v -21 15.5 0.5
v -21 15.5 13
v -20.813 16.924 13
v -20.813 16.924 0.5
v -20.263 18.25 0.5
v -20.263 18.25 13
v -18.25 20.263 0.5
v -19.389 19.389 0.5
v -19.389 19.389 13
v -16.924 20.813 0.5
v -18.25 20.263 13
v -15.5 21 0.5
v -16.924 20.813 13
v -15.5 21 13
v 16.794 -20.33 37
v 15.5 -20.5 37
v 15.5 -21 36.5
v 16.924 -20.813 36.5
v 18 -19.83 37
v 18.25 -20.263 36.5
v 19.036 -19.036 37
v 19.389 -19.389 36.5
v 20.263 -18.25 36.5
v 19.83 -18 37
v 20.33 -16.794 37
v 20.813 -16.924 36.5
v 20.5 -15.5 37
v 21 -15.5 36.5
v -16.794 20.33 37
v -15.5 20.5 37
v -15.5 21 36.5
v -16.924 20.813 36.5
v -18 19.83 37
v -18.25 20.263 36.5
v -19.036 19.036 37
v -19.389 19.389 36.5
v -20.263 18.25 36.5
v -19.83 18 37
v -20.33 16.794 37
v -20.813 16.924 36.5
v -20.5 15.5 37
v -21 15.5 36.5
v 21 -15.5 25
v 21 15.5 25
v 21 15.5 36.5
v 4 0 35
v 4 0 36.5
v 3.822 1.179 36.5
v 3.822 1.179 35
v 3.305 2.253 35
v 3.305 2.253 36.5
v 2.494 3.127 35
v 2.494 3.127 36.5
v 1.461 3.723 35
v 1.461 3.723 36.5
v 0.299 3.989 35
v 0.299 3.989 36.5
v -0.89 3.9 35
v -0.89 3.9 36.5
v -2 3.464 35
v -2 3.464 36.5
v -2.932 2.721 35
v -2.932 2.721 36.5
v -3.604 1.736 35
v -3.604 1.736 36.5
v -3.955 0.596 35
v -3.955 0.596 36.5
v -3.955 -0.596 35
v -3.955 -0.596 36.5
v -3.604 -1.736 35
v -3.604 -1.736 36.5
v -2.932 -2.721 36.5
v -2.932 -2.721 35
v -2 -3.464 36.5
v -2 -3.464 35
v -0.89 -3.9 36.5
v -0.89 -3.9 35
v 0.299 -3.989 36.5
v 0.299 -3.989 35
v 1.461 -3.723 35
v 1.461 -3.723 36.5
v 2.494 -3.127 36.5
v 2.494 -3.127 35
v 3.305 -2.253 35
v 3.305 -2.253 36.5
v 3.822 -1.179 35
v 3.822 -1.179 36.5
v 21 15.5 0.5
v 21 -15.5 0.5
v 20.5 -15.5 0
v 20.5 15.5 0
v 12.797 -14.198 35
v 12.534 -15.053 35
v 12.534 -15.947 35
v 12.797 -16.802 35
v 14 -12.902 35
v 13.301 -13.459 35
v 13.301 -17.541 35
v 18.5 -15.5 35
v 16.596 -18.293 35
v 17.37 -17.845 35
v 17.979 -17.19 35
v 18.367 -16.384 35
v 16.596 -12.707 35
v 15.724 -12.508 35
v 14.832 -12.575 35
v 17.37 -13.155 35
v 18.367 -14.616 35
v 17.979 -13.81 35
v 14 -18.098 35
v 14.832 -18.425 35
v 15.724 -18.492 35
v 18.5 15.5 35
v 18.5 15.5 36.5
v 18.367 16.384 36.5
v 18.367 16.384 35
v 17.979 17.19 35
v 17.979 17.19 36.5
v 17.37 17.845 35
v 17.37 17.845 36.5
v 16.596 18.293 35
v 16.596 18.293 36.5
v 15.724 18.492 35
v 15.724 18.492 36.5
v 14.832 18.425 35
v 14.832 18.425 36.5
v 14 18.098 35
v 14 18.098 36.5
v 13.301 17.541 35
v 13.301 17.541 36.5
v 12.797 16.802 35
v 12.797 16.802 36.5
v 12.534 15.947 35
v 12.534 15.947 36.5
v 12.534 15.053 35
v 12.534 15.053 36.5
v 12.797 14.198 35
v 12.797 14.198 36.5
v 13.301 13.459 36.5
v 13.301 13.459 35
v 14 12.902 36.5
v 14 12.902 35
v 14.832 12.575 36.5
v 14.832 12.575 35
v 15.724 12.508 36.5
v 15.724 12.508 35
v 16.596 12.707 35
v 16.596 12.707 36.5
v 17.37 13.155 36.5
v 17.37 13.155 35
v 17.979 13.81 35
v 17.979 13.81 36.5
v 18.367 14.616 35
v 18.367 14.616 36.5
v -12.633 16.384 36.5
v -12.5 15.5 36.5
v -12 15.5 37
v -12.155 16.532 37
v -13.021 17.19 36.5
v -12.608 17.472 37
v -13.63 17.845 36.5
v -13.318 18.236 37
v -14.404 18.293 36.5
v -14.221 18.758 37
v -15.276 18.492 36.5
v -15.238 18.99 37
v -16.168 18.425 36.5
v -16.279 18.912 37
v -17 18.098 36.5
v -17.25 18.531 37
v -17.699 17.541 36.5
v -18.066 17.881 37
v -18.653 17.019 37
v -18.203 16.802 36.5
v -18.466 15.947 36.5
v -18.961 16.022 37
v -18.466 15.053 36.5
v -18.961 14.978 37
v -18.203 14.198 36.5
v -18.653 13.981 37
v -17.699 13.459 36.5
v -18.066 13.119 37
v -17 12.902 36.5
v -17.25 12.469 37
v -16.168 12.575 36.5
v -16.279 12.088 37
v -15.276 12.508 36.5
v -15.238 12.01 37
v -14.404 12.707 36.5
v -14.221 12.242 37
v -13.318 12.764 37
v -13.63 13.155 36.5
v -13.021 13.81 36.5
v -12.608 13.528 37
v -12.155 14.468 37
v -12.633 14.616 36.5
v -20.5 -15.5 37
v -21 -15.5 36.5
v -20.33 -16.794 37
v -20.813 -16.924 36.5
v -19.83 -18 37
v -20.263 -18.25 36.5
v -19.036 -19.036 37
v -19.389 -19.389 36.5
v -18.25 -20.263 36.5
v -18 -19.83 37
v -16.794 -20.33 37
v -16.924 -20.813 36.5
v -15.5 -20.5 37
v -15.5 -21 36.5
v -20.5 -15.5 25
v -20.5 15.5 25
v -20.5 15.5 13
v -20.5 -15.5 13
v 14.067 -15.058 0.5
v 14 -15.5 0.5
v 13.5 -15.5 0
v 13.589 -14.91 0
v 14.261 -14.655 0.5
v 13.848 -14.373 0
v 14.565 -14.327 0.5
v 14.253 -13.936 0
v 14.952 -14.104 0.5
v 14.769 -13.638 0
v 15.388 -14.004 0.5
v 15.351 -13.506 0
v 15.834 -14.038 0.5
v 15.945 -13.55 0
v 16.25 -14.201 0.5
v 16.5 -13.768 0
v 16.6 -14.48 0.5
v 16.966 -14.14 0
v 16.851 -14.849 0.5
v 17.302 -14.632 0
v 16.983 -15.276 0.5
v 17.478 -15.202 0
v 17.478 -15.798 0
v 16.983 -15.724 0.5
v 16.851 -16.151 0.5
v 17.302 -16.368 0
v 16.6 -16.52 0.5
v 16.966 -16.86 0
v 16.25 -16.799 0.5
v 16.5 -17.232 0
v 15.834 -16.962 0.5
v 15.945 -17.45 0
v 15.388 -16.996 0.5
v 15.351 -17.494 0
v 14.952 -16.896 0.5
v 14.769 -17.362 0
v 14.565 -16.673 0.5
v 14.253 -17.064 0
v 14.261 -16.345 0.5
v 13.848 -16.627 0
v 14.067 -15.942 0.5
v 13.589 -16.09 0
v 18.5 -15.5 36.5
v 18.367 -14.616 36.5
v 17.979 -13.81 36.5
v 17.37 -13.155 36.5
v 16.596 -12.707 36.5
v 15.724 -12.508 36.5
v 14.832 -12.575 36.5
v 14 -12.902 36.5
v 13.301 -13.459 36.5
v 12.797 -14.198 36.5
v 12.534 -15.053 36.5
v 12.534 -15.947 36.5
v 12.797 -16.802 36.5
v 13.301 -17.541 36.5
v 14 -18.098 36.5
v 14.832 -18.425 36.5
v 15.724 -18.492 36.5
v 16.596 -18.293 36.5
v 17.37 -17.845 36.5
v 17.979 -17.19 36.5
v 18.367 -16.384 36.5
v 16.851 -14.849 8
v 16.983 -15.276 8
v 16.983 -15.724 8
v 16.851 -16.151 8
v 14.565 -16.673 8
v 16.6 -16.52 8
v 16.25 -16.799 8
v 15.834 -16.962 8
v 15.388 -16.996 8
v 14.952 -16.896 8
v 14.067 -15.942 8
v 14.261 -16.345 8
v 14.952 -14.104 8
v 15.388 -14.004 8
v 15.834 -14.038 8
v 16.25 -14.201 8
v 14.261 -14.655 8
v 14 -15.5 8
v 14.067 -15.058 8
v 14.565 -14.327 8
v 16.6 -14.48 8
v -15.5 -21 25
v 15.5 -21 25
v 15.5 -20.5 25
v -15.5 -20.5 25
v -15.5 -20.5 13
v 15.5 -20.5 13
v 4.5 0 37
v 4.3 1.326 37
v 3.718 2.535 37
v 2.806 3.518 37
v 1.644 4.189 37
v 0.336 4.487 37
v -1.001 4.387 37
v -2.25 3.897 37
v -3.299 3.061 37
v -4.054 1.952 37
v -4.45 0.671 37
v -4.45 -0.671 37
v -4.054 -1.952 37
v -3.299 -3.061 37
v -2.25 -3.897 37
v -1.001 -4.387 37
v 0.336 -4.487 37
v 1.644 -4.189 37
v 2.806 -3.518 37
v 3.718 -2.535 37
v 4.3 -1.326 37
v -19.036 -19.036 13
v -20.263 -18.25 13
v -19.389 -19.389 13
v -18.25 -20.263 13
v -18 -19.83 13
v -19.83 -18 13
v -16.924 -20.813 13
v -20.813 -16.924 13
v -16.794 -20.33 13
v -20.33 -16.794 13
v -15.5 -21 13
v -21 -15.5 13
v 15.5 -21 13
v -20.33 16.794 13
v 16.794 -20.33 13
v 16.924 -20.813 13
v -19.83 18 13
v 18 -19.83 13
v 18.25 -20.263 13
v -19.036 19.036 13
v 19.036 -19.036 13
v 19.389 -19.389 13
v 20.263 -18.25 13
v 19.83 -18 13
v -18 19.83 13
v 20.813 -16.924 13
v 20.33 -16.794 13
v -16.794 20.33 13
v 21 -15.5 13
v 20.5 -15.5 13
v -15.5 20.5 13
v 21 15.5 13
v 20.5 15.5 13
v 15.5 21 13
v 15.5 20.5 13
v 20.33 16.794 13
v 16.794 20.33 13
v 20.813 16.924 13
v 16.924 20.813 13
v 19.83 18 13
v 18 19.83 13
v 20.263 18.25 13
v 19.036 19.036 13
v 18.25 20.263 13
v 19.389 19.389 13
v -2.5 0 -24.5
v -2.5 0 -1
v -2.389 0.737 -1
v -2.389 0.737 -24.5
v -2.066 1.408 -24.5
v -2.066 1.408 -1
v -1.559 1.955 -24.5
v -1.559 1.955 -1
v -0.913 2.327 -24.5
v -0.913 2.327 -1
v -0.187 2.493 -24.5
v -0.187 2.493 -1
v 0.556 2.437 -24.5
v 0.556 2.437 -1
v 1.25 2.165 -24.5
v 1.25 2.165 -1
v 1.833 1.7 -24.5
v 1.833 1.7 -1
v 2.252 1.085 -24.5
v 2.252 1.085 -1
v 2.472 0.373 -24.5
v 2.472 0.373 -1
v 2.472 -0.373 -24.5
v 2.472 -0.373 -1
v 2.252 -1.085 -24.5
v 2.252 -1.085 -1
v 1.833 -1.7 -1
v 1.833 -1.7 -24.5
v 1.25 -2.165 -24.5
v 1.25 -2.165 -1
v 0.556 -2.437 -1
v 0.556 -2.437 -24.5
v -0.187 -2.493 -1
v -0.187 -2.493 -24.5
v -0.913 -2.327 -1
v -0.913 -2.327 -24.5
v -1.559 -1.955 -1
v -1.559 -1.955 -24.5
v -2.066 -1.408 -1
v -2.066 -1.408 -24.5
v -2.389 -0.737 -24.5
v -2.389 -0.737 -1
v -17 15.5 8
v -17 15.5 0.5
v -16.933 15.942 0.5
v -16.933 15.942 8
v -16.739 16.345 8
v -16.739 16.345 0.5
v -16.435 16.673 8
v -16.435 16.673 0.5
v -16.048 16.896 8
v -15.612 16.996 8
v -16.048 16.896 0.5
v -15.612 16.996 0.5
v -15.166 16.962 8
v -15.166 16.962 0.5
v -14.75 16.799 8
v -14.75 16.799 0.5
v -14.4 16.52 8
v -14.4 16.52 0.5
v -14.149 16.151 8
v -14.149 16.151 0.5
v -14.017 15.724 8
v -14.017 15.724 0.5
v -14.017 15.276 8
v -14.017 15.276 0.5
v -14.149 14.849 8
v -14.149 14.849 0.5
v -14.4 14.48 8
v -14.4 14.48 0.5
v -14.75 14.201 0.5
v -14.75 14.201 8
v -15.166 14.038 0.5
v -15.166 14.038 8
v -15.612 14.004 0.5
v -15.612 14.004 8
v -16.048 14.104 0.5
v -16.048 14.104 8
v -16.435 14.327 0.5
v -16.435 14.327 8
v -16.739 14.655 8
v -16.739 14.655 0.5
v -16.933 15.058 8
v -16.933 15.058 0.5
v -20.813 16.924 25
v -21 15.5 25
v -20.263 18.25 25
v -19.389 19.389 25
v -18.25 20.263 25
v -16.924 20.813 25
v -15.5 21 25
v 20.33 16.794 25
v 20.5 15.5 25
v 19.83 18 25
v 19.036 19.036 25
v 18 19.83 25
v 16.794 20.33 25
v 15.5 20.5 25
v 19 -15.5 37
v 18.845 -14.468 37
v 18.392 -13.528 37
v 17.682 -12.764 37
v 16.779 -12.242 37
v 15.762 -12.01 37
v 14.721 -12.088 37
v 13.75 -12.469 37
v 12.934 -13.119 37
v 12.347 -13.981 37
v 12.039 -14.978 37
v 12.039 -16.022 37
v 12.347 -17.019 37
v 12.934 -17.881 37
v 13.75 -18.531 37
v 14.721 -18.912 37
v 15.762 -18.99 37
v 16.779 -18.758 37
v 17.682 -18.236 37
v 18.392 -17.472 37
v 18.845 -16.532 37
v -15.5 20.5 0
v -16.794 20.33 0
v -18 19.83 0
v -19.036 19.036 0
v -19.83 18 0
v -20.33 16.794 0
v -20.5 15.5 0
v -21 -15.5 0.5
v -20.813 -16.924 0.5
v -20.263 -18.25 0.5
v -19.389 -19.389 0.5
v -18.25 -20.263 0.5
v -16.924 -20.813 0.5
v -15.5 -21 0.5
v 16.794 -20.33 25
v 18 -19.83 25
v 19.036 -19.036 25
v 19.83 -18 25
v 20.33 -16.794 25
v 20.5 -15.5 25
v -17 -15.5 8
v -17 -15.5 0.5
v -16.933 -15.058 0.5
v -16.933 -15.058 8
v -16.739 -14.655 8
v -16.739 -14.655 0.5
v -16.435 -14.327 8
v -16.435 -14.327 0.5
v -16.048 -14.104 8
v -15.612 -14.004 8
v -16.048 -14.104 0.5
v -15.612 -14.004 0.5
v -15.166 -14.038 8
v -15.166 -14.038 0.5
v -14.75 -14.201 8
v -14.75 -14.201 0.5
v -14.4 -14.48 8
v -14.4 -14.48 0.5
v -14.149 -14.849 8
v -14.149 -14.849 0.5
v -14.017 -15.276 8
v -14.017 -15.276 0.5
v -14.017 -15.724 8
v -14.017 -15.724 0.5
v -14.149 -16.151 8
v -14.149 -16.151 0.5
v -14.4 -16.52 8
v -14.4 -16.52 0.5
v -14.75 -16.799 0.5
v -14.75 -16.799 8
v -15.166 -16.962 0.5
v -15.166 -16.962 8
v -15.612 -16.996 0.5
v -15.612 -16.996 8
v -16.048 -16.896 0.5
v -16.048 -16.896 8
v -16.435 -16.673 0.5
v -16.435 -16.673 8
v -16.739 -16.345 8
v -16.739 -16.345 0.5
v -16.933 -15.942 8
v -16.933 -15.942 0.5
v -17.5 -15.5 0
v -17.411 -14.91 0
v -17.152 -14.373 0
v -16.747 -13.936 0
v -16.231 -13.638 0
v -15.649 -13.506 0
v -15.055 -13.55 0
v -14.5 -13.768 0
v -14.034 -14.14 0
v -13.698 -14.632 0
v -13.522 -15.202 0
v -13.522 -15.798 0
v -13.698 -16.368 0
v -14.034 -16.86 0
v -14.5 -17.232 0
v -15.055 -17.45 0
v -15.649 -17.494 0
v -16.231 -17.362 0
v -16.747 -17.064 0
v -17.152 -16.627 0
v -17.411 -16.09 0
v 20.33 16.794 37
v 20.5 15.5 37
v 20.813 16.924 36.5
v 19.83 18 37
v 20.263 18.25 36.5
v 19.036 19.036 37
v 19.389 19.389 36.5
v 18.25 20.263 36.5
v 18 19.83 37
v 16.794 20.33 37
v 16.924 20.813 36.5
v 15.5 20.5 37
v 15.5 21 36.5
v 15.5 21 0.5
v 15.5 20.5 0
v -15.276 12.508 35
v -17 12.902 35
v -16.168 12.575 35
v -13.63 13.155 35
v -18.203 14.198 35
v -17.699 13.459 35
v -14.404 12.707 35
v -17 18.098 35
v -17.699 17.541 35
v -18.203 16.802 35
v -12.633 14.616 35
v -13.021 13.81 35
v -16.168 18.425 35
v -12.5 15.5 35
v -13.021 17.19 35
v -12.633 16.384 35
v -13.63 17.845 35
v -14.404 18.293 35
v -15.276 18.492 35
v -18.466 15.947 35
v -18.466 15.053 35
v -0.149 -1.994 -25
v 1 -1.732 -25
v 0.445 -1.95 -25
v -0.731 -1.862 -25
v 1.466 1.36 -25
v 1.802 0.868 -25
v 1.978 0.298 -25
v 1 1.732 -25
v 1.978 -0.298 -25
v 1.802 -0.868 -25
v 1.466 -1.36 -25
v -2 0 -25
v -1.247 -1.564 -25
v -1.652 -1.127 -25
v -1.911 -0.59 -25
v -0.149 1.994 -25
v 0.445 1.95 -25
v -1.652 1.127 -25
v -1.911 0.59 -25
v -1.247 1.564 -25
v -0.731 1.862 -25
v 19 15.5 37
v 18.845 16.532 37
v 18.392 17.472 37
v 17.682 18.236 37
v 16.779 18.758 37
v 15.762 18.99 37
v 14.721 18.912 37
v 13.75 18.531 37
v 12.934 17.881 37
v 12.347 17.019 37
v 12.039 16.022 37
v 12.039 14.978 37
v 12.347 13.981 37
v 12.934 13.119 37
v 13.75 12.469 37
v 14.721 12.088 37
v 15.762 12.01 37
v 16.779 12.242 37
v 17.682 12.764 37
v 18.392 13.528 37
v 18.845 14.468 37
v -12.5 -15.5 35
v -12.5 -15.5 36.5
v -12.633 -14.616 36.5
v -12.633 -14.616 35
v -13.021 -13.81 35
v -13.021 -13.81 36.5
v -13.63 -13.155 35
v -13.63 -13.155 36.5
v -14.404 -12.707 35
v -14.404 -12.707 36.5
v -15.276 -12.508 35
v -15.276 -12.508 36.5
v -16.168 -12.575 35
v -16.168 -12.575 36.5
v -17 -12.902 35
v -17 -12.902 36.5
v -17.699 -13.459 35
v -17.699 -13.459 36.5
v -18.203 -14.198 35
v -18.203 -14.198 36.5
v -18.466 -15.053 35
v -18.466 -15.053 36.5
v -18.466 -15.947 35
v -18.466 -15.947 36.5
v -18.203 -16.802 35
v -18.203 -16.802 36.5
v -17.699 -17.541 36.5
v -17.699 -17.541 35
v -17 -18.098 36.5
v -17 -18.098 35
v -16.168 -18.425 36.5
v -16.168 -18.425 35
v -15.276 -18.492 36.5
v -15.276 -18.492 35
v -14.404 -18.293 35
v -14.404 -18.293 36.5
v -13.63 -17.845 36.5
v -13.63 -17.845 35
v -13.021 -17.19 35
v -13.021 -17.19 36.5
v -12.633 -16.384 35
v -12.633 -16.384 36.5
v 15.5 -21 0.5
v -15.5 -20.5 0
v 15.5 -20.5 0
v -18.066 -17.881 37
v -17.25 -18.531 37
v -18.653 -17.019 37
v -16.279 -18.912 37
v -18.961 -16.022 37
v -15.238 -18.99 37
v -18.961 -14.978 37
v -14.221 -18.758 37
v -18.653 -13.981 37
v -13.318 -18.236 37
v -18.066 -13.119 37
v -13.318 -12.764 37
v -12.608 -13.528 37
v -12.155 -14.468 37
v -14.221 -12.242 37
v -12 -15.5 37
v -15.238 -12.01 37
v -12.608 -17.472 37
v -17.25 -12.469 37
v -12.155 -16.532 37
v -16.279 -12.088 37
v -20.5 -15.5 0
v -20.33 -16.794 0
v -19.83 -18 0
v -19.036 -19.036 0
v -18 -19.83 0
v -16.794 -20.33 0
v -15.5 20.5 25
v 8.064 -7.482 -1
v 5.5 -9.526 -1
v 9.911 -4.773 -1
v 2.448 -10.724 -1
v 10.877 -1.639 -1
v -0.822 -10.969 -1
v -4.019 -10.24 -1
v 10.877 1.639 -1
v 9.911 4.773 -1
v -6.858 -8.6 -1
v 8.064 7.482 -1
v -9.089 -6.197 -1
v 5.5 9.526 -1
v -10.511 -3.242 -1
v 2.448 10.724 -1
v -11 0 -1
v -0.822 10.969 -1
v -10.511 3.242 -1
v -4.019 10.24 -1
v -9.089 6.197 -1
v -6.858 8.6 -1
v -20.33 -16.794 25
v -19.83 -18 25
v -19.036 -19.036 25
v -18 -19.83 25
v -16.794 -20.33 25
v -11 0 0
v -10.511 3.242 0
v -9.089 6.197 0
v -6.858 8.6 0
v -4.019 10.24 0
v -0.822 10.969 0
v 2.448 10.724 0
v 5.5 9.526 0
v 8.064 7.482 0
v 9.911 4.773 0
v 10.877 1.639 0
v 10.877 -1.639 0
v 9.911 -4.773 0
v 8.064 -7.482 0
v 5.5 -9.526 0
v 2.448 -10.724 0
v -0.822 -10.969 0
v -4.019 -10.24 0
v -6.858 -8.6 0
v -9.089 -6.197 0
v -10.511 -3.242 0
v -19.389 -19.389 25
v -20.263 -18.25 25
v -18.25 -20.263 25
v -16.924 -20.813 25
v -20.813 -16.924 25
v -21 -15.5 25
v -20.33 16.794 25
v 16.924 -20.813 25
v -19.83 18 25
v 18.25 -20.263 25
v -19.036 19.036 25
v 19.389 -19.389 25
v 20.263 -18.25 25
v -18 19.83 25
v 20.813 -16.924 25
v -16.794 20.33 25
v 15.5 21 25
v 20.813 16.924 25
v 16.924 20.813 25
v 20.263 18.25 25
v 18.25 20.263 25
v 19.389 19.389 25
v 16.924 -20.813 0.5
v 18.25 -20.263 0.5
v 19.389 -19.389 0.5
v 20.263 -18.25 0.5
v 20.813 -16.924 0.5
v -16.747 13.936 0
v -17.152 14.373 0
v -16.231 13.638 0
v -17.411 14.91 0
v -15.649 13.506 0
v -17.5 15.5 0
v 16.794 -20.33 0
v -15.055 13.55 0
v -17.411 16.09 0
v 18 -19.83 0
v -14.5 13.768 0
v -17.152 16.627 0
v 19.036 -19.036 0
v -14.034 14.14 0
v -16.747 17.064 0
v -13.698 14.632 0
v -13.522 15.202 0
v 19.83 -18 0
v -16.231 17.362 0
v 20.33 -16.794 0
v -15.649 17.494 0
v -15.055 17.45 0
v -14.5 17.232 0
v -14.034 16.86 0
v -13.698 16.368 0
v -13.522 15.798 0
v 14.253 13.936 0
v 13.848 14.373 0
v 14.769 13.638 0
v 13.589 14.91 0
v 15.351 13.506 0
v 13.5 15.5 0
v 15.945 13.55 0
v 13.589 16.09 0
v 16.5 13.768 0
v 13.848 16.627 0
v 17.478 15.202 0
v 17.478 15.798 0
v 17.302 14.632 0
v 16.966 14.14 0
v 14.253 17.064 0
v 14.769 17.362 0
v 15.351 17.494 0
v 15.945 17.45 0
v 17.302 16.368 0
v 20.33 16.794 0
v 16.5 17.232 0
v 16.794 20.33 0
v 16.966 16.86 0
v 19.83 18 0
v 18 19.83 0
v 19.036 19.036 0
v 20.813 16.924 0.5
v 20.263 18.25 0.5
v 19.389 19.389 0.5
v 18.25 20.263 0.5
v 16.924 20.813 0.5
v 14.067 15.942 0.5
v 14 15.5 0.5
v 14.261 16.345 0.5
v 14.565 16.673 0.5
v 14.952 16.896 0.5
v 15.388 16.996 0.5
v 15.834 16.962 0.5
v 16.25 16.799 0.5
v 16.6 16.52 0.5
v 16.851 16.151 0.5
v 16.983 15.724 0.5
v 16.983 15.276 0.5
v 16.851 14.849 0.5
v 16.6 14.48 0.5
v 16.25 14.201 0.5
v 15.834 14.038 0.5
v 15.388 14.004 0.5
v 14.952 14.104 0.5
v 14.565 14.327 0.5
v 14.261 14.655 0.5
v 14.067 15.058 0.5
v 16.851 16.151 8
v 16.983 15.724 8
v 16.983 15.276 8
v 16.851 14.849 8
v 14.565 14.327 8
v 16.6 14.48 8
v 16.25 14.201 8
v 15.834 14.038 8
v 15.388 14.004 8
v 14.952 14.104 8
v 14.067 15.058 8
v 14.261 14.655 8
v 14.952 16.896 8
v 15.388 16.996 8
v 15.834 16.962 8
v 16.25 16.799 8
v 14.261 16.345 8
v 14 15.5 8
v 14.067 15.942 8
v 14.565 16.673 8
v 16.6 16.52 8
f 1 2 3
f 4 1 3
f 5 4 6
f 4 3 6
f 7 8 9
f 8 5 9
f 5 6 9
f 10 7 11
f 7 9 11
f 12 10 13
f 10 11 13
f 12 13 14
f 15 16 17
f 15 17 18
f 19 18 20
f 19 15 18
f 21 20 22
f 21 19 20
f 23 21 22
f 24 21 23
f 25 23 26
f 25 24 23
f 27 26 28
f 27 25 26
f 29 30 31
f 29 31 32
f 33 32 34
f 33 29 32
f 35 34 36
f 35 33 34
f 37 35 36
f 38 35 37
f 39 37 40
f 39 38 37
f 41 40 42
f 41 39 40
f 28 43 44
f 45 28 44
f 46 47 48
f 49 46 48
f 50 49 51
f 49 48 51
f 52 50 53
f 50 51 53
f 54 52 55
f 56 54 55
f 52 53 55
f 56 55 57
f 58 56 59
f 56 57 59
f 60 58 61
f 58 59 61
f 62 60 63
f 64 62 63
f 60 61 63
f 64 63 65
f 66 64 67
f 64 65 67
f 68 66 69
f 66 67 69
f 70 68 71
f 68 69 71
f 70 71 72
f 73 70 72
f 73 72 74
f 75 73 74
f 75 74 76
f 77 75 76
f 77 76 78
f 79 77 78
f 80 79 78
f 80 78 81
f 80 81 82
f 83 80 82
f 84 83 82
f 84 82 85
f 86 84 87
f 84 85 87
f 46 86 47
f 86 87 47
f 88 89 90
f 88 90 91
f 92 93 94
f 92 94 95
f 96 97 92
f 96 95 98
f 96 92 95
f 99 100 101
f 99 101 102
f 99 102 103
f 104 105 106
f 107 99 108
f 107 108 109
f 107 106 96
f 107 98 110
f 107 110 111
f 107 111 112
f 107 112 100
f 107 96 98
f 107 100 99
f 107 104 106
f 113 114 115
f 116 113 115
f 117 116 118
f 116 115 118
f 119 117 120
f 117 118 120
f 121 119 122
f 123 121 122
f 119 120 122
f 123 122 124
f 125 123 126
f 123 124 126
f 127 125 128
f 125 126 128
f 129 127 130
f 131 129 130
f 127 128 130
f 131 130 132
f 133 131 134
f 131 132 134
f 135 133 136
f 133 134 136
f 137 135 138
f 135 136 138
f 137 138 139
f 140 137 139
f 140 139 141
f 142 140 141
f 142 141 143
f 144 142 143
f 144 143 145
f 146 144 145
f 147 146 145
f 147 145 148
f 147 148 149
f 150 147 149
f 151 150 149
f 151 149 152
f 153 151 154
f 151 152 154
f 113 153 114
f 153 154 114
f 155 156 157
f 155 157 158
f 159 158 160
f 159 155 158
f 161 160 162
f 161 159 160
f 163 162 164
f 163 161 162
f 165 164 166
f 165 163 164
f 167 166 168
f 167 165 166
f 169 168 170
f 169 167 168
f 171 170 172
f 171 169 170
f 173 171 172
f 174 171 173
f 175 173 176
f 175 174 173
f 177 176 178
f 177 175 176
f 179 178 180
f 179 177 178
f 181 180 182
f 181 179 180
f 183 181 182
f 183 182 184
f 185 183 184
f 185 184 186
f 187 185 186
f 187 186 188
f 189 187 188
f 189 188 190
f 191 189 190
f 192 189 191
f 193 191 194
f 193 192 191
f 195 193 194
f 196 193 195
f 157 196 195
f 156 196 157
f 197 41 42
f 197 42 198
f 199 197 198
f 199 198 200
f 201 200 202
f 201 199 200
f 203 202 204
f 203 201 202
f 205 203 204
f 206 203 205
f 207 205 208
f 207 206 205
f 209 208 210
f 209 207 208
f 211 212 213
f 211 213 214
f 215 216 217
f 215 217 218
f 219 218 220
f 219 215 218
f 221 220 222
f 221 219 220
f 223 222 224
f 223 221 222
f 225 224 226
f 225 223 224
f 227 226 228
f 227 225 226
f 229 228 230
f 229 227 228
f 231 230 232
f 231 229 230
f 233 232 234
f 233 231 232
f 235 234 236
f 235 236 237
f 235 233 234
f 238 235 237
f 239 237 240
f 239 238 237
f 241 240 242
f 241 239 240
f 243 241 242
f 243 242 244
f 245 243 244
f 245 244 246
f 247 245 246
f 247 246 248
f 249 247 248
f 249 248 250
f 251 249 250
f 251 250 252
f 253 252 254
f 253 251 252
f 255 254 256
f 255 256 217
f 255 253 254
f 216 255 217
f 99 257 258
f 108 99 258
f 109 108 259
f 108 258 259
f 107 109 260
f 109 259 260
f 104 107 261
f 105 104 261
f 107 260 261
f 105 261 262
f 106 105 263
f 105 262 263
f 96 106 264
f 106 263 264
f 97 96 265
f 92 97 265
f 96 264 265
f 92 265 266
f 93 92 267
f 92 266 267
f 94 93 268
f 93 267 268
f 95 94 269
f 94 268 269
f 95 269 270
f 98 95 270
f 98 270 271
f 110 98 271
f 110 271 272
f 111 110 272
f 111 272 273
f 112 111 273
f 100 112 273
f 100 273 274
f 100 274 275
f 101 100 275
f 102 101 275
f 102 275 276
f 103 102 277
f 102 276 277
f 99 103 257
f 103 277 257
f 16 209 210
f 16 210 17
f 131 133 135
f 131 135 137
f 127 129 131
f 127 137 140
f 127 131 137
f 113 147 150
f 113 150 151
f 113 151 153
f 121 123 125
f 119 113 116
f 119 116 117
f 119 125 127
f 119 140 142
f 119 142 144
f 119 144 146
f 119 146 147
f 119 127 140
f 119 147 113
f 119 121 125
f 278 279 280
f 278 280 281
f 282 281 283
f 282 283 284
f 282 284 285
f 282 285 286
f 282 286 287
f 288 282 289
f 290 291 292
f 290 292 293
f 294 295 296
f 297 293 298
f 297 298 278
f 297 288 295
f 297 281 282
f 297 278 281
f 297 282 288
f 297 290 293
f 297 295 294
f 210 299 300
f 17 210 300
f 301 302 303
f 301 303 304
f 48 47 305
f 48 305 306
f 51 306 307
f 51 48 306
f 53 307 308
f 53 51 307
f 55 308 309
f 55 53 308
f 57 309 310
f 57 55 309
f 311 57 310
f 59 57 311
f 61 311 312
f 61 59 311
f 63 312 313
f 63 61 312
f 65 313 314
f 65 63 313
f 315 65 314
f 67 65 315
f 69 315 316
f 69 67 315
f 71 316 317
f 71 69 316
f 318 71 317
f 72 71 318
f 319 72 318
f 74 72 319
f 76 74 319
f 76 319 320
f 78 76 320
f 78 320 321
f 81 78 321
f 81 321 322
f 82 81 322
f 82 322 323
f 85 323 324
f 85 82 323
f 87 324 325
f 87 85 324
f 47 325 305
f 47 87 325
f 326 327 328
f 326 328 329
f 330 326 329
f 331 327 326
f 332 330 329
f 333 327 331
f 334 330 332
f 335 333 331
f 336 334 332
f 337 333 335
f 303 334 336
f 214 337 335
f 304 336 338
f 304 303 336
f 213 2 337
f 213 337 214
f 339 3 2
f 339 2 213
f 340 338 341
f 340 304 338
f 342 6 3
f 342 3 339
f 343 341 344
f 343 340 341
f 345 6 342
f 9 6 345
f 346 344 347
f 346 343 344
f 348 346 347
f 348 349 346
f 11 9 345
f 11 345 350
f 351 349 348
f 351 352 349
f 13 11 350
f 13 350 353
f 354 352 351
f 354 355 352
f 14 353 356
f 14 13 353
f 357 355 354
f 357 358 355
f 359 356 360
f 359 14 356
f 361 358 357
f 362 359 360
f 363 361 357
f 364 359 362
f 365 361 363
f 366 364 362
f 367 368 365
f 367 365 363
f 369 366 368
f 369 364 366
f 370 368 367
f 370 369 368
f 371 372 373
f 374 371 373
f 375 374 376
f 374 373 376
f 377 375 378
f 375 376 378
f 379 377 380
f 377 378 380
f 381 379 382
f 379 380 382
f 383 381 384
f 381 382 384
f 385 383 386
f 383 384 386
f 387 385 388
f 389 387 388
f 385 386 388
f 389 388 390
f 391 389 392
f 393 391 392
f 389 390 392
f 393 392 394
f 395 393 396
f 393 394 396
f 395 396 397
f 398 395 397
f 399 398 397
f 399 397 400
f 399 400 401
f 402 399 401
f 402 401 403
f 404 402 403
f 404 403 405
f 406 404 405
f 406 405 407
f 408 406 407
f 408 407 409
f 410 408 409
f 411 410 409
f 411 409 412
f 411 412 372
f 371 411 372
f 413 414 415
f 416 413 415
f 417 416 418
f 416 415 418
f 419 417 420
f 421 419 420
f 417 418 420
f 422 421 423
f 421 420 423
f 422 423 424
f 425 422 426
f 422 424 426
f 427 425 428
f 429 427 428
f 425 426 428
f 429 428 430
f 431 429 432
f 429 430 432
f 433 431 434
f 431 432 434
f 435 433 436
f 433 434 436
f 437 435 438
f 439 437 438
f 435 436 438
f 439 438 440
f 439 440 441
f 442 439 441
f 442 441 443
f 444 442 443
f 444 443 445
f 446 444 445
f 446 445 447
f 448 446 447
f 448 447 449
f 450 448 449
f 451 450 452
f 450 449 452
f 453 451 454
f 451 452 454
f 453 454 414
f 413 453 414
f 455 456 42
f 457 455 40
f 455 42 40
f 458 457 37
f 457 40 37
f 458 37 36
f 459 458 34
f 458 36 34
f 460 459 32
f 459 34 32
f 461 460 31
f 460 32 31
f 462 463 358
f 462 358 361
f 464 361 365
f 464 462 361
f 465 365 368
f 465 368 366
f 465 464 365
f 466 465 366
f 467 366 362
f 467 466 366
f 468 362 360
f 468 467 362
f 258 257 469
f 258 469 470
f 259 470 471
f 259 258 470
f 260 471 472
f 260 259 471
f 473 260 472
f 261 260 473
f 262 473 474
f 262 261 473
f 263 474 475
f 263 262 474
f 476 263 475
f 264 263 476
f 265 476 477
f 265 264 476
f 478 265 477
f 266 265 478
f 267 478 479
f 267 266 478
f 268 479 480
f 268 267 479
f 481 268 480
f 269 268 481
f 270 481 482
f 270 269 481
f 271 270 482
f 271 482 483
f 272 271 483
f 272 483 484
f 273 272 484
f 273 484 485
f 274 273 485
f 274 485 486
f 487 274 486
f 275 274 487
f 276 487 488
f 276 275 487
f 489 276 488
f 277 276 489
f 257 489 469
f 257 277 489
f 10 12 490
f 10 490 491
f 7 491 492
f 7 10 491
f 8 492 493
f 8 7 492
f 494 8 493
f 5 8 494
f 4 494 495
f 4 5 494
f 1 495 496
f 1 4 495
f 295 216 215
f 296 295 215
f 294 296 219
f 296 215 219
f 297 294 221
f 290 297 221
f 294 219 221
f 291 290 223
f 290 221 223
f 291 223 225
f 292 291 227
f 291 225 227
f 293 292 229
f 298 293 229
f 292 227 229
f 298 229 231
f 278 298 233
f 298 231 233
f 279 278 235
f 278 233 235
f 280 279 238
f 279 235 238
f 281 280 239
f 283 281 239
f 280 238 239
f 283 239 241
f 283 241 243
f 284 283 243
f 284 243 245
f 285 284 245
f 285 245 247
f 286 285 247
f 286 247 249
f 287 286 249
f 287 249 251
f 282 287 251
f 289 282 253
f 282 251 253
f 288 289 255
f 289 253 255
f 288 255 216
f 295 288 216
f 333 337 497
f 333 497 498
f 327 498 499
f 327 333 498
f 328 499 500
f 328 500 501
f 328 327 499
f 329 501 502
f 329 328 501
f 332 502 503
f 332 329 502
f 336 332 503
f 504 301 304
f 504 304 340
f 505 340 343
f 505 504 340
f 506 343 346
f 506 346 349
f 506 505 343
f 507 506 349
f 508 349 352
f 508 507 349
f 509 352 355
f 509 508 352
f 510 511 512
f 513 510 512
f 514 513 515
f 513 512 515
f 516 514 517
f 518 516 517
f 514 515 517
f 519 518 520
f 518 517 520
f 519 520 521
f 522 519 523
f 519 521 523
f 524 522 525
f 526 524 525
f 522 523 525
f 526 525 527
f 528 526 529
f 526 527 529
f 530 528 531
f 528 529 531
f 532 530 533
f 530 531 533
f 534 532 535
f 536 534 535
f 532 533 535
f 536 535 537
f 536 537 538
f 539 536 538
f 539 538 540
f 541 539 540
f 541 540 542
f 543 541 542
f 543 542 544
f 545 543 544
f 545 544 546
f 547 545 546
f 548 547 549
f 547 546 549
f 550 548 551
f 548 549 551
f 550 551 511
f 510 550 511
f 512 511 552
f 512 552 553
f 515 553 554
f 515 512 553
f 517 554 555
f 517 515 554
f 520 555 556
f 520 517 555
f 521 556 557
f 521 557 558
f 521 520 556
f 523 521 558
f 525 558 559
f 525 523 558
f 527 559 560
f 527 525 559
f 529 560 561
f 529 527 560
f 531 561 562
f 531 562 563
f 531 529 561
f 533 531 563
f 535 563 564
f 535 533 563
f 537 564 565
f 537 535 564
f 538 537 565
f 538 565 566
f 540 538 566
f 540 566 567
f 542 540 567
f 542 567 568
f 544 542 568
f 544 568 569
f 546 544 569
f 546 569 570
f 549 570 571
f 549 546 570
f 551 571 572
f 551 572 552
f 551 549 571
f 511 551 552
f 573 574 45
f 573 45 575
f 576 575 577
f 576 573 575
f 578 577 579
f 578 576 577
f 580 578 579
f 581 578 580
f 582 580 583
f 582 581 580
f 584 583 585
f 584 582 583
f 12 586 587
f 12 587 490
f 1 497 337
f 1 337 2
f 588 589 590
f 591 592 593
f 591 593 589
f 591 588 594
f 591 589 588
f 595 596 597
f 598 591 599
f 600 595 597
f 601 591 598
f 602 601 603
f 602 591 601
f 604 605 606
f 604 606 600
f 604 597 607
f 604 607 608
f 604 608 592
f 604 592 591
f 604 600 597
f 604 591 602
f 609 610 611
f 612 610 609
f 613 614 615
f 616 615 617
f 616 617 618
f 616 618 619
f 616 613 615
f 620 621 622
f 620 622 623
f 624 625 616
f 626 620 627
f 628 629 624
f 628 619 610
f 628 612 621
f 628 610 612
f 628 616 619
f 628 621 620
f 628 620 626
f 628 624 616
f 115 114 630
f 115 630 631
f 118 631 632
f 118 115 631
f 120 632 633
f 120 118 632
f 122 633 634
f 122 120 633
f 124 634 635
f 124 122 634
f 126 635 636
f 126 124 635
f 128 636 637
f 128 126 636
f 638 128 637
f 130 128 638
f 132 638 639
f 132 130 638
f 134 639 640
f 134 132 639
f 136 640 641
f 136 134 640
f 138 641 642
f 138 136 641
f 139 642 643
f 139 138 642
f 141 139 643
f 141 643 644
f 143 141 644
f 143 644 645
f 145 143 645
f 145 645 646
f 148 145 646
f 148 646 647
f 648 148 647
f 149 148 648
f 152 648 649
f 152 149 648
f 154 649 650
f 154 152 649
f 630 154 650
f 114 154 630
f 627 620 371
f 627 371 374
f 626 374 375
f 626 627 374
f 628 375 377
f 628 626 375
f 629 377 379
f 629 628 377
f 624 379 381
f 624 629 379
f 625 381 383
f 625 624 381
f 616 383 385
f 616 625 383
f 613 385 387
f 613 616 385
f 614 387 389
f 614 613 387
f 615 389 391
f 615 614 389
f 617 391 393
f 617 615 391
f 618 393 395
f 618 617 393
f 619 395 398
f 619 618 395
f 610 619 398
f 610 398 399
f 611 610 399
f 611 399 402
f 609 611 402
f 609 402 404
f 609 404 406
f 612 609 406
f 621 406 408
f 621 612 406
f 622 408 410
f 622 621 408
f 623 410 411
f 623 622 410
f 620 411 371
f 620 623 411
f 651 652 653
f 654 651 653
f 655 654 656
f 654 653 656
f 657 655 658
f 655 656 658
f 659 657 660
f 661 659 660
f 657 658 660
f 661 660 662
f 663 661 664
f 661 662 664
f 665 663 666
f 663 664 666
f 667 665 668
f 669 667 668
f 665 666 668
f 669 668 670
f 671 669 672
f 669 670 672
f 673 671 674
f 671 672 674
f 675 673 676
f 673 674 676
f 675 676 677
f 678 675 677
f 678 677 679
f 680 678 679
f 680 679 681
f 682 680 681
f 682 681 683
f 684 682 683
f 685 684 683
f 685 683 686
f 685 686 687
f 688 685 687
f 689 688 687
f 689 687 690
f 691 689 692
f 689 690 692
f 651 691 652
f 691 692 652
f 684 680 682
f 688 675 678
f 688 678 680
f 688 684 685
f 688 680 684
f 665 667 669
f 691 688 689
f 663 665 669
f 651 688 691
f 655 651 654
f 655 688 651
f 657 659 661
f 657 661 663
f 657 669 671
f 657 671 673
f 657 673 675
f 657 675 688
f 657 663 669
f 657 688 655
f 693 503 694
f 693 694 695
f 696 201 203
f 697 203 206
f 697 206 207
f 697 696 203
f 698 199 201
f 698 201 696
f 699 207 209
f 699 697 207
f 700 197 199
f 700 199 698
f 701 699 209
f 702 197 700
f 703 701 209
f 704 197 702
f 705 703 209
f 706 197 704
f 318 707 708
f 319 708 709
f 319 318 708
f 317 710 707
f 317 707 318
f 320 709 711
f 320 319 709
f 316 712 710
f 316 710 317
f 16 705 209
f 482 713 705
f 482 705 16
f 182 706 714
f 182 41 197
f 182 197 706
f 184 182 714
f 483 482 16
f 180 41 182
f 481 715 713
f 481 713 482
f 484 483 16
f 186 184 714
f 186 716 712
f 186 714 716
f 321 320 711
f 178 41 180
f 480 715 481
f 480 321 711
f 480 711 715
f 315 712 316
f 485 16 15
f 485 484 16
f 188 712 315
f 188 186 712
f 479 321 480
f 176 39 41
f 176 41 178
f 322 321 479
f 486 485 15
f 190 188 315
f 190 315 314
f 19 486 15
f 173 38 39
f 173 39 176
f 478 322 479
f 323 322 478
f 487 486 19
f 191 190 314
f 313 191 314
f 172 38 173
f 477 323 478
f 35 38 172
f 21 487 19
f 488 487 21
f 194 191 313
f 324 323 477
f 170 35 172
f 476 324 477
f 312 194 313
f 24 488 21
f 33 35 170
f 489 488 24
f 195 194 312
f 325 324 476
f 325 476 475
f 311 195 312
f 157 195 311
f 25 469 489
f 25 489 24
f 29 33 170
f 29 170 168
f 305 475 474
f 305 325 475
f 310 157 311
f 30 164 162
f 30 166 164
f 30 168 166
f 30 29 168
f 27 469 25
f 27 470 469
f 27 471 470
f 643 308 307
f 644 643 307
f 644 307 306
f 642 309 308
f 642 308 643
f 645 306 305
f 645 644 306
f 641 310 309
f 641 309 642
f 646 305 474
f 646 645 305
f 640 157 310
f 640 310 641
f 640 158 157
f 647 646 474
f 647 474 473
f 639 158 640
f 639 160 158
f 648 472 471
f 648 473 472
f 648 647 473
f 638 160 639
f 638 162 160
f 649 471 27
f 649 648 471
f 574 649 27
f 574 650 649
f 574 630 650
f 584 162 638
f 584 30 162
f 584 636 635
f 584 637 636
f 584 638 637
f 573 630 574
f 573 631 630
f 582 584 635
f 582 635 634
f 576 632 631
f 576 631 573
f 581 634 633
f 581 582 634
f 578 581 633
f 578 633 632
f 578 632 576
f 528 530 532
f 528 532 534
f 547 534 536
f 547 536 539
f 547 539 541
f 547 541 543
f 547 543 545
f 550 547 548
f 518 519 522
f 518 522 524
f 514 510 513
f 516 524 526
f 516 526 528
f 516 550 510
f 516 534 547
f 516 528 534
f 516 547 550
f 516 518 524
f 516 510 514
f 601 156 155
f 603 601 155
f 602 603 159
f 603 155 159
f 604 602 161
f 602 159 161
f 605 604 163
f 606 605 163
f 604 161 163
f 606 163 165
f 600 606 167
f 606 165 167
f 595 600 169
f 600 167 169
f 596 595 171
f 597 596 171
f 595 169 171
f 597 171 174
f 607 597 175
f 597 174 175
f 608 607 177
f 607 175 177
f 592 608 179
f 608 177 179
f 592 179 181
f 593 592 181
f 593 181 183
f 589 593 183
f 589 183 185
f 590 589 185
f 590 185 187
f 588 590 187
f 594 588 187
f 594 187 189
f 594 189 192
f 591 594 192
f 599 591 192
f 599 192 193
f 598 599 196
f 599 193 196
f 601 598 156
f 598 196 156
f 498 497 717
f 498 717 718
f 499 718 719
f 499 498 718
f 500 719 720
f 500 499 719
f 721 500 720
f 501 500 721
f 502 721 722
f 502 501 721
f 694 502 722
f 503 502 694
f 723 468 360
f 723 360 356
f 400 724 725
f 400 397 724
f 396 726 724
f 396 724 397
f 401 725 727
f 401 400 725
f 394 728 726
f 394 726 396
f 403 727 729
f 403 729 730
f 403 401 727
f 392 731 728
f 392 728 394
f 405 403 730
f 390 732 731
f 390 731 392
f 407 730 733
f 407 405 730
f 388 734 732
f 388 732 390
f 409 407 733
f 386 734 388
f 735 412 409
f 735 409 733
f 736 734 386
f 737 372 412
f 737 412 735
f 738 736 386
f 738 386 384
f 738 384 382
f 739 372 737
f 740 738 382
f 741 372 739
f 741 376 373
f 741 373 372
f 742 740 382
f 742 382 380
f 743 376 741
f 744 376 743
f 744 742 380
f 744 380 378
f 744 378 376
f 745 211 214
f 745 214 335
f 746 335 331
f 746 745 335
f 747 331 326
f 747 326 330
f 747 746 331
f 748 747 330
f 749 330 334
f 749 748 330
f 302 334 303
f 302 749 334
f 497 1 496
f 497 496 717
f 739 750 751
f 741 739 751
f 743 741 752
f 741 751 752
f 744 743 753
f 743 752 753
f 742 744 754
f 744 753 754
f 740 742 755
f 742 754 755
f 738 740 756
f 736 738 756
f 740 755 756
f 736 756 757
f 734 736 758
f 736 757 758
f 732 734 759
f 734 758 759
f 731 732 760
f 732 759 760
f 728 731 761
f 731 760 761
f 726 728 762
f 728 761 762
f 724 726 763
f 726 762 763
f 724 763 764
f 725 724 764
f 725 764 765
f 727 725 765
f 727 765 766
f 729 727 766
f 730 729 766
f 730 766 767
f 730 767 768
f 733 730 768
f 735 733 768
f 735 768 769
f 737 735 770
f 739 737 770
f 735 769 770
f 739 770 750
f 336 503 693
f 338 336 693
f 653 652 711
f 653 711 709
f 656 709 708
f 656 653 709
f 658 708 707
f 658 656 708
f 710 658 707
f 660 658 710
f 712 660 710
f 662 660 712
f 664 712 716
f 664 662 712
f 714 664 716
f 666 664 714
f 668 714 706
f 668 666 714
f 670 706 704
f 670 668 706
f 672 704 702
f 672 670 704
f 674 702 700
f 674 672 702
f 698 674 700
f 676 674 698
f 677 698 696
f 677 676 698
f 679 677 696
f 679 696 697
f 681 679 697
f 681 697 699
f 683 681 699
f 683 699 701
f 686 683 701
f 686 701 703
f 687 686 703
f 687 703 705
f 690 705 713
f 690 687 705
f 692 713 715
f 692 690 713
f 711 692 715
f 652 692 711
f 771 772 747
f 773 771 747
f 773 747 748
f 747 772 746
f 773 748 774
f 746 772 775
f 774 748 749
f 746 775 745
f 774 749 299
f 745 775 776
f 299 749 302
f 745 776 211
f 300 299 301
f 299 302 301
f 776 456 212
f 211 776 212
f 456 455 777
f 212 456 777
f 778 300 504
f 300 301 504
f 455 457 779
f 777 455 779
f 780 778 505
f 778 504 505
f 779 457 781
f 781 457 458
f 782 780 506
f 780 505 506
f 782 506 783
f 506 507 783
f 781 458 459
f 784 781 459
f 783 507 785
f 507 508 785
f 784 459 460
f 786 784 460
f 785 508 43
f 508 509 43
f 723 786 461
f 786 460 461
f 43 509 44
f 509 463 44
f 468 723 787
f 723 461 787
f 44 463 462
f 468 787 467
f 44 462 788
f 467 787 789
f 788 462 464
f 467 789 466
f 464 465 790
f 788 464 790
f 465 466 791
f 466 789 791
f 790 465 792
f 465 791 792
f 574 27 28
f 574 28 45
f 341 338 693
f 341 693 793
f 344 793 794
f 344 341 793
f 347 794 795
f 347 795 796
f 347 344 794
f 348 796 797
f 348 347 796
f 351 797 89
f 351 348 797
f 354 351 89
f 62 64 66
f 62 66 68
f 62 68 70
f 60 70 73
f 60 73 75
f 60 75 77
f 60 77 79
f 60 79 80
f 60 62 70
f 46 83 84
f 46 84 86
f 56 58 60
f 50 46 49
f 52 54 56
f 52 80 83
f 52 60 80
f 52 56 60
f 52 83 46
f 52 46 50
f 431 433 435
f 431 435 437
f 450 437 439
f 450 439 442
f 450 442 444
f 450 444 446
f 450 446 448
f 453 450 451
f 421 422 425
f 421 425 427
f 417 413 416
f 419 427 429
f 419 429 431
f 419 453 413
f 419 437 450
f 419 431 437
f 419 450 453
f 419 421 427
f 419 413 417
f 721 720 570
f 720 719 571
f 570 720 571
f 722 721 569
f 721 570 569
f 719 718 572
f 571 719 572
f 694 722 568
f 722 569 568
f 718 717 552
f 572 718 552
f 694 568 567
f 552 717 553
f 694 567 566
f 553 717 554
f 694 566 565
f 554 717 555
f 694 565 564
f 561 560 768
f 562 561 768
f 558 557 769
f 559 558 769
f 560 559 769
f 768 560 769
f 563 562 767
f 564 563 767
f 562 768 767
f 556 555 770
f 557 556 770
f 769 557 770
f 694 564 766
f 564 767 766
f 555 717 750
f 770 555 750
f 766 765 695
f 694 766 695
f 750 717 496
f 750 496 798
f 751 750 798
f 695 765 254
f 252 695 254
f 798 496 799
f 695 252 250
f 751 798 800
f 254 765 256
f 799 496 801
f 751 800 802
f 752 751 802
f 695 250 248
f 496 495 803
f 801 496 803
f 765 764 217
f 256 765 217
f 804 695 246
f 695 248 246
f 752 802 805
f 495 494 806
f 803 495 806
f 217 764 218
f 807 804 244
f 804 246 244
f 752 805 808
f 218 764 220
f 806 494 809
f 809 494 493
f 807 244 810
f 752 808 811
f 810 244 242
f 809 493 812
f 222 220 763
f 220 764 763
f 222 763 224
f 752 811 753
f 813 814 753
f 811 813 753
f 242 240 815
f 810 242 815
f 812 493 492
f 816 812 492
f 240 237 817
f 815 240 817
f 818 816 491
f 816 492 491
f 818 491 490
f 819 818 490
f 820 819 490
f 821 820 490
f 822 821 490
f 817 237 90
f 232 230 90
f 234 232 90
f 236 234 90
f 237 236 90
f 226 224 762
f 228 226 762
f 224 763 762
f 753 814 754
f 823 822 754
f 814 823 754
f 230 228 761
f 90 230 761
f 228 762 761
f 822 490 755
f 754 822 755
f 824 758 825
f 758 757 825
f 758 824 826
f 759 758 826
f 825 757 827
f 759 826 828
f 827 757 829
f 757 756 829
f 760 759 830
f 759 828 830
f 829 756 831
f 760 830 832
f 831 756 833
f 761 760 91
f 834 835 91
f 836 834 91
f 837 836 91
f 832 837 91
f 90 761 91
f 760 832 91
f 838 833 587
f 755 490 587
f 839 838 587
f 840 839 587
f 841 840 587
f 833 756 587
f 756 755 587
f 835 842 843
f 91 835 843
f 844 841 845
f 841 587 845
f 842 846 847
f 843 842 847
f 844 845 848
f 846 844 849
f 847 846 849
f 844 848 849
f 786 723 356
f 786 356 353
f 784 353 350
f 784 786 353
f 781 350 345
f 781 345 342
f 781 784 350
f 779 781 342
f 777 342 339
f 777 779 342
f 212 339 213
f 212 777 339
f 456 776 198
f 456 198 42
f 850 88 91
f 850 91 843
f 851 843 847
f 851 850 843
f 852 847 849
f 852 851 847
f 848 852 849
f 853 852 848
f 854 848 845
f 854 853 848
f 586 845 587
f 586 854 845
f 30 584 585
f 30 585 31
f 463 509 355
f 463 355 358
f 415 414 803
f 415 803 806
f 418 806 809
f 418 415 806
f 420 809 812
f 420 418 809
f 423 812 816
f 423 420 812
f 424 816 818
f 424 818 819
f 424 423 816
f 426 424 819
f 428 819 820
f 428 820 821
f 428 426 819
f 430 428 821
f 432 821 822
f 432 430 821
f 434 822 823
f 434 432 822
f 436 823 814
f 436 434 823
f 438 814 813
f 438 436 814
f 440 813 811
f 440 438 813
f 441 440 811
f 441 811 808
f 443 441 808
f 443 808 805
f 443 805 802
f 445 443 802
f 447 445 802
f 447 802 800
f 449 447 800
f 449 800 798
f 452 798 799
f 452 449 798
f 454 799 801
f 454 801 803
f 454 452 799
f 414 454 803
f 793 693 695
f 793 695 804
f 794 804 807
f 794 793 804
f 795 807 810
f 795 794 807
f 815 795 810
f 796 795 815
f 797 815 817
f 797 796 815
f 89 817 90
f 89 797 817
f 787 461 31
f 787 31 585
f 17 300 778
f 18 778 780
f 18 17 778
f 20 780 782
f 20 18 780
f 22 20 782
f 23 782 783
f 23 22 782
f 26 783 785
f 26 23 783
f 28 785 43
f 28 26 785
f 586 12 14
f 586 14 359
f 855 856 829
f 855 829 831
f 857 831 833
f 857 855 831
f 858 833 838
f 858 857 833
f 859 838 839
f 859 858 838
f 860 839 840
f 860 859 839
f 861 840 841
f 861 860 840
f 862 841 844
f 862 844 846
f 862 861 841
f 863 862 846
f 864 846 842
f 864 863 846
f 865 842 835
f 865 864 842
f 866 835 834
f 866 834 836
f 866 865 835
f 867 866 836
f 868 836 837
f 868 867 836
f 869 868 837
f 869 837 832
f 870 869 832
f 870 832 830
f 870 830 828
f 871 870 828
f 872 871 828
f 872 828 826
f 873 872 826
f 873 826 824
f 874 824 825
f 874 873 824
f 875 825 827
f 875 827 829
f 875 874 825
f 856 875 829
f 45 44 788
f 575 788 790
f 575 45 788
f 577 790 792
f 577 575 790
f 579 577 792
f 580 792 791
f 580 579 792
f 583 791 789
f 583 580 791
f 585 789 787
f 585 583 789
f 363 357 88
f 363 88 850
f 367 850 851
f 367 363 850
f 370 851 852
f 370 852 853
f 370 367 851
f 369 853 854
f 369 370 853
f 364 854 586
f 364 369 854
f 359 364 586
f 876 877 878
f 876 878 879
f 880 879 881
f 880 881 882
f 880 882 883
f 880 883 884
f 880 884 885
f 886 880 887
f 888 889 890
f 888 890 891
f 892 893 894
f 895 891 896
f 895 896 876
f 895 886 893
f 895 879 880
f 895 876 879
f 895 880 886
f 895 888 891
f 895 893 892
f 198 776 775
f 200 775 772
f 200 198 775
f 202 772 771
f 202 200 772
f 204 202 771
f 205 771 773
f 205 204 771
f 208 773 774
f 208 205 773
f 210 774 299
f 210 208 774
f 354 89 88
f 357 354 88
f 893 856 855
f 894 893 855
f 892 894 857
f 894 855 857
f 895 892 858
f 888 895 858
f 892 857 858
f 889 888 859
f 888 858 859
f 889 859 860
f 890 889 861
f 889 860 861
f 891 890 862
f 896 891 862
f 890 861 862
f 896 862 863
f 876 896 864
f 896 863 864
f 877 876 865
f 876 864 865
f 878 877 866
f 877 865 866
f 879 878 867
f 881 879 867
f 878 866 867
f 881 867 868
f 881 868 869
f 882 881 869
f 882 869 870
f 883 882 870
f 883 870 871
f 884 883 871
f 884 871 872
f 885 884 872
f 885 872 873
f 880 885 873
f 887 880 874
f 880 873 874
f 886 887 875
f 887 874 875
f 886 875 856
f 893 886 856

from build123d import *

# Parameters (mm, degrees)
SKETCH1_W           = 42
SKETCH1_H           = 42
BOSS_EXTRUDE1_DEPTH = 37
FILLET1_R           = 5.5
SKETCH2_R           = 4
SKETCH2_R_2         = 3
CUT_EXTRUDE1_DEPTH  = 2
SKETCH4_R           = 2.5
BOSS_EXTRUDE2_DEPTH = 25
SKETCH5_R           = 1.5
CUT_EXTRUDE2_DEPTH  = 8
CUT_EXTRUDE3_START  = -12
SKETCH6_R           = 34.308404515
CUT_EXTRUDE3_DEPTH  = 12
CHAMFER1_SIZE       = 0.5
SKETCH7_R           = 11
BOSS_EXTRUDE3_DEPTH = 1


with BuildPart() as part:
    # Sketch1 → Boss-Extrude1 (new body)
    with BuildSketch(Plane.XY):
        Rectangle(SKETCH1_W, SKETCH1_H)
    extrude(amount=BOSS_EXTRUDE1_DEPTH)

    # Fillet1
    fillet1_edges = [part.edges().sort_by_distance(p)[0] for p in [
        (21, -21, 18.5),
        (-21, -21, 18.5),
        (-21, 21, 18.5),
        (21, 21, 18.5),
    ]]
    fillet(fillet1_edges, radius=FILLET1_R)

    # Sketch2 → Cut-Extrude1 (cut)
    with BuildSketch(Plane.XY.offset(37)):
        Circle(SKETCH2_R)
        with Locations((15.5, -15.5)):
            Circle(SKETCH2_R_2)
        with Locations((15.5, 15.5)):
            Circle(SKETCH2_R_2)
        with Locations((-15.5, 15.5)):
            Circle(SKETCH2_R_2)
        with Locations((-15.5, -15.5)):
            Circle(SKETCH2_R_2)
    extrude(amount=-CUT_EXTRUDE1_DEPTH, mode=Mode.SUBTRACT)

    # Sketch4 → Boss-Extrude2 (add)
    with BuildSketch(Plane(origin=(0, 0, 0), x_dir=(-1, 0, 0), z_dir=(0, 0, -1))):
        Circle(SKETCH4_R)
    extrude(amount=BOSS_EXTRUDE2_DEPTH)

    # Sketch5 → Cut-Extrude2 (cut)
    with BuildSketch(Plane(origin=(0, 0, 0), x_dir=(-1, 0, 0), z_dir=(0, 0, -1))):
        with Locations((15.5, -15.5)):
            Circle(SKETCH5_R)
        with Locations((-15.5, -15.5)):
            Circle(SKETCH5_R)
        with Locations((15.5, 15.5)):
            Circle(SKETCH5_R)
        with Locations((-15.5, 15.5)):
            Circle(SKETCH5_R)
    extrude(amount=-CUT_EXTRUDE2_DEPTH, mode=Mode.SUBTRACT)

    # Sketch6 → Cut-Extrude3 (cut)
    # profile 1 of 2: a face of its own
    with BuildSketch(Plane.XY.offset(37).offset(CUT_EXTRUDE3_START)):
        Circle(SKETCH6_R)
        with BuildLine():
            Line((-21, 15.5), (-21, -15.5))
            ThreePointArc((-21, -15.5), (-19.389087297, -19.389087297), (-15.5, -21))
            Line((-15.5, -21), (15.5, -21))
            ThreePointArc((15.5, -21), (19.389087297, -19.389087297), (21, -15.5))
            Line((21, -15.5), (21, 15.5))
            ThreePointArc((21, 15.5), (19.389087297, 19.389087297), (15.5, 21))
            Line((15.5, 21), (-15.5, 21))
            ThreePointArc((-15.5, 21), (-19.389087297, 19.389087297), (-21, 15.5))
        make_face(mode=Mode.SUBTRACT)
    # profile 2 of 2: a face of its own
    with BuildSketch(Plane.XY.offset(37).offset(CUT_EXTRUDE3_START)):
        with BuildLine():
            ThreePointArc((-15.5, 21), (-19.389087297, 19.389087297), (-21, 15.5))
            Line((-21, 15.5), (-21, -15.5))
            ThreePointArc((-21, -15.5), (-19.389087297, -19.389087297), (-15.5, -21))
            Line((-15.5, -21), (15.5, -21))
            ThreePointArc((15.5, -21), (19.389087297, -19.389087297), (21, -15.5))
            Line((21, -15.5), (21, 15.5))
            ThreePointArc((21, 15.5), (19.389087297, 19.389087297), (15.5, 21))
            Line((15.5, 21), (-15.5, 21))
        make_face()
        with BuildLine():
            ThreePointArc((-15.5, 20.5), (-19.035533906, 19.035533906), (-20.5, 15.5))
            Line((-20.5, 15.5), (-20.5, -15.5))
            ThreePointArc((-20.5, -15.5), (-19.035533906, -19.035533906), (-15.5, -20.5))
            Line((-15.5, -20.5), (15.5, -20.5))
            ThreePointArc((15.5, -20.5), (19.035533906, -19.035533906), (20.5, -15.5))
            Line((20.5, -15.5), (20.5, 15.5))
            ThreePointArc((20.5, 15.5), (19.035533906, 19.035533906), (15.5, 20.5))
            Line((15.5, 20.5), (-15.5, 20.5))
        make_face(mode=Mode.SUBTRACT)
    extrude(amount=-CUT_EXTRUDE3_DEPTH, mode=Mode.SUBTRACT)

    # Chamfer1
    chamfer1_edges = [part.edges().sort_by_distance(p)[0] for p in [
        (0, -21, 0),
        (0, -21, 37),
        (21, 0, 0),
        (-21, 0, 0),
        (0, 21, 0),
        (-19.389087297, 19.389087297, 0),
        (19.389087297, 19.389087297, 0),
        (19.389087297, -19.389087297, 0),
        (-19.389087297, -19.389087297, 0),
        (-21, 0, 37),
        (21, 0, 37),
        (0, 21, 37),
        (-19.389087297, 19.389087297, 37),
        (19.389087297, 19.389087297, 37),
        (19.389087297, -19.389087297, 37),
        (-19.389087297, -19.389087297, 37),
        (-4, 0, 37),
        (12.5, -15.5, 37),
        (12.5, 15.5, 37),
        (-18.5, 15.5, 37),
        (-18.5, -15.5, 37),
        (2.5, 0, 0),
        (2.5, 0, -25),
        (-14, -15.5, 0),
        (17, -15.5, 0),
        (-14, 15.5, 0),
        (17, 15.5, 0),
    ]]
    chamfer(chamfer1_edges, length=CHAMFER1_SIZE)

    # Sketch7 → Boss-Extrude3 (add)
    with BuildSketch(Plane(origin=(0, 0, 0), x_dir=(-1, 0, 0), z_dir=(0, 0, -1))):
        Circle(SKETCH7_R)
    extrude(amount=BOSS_EXTRUDE3_DEPTH)


solid = part.part
